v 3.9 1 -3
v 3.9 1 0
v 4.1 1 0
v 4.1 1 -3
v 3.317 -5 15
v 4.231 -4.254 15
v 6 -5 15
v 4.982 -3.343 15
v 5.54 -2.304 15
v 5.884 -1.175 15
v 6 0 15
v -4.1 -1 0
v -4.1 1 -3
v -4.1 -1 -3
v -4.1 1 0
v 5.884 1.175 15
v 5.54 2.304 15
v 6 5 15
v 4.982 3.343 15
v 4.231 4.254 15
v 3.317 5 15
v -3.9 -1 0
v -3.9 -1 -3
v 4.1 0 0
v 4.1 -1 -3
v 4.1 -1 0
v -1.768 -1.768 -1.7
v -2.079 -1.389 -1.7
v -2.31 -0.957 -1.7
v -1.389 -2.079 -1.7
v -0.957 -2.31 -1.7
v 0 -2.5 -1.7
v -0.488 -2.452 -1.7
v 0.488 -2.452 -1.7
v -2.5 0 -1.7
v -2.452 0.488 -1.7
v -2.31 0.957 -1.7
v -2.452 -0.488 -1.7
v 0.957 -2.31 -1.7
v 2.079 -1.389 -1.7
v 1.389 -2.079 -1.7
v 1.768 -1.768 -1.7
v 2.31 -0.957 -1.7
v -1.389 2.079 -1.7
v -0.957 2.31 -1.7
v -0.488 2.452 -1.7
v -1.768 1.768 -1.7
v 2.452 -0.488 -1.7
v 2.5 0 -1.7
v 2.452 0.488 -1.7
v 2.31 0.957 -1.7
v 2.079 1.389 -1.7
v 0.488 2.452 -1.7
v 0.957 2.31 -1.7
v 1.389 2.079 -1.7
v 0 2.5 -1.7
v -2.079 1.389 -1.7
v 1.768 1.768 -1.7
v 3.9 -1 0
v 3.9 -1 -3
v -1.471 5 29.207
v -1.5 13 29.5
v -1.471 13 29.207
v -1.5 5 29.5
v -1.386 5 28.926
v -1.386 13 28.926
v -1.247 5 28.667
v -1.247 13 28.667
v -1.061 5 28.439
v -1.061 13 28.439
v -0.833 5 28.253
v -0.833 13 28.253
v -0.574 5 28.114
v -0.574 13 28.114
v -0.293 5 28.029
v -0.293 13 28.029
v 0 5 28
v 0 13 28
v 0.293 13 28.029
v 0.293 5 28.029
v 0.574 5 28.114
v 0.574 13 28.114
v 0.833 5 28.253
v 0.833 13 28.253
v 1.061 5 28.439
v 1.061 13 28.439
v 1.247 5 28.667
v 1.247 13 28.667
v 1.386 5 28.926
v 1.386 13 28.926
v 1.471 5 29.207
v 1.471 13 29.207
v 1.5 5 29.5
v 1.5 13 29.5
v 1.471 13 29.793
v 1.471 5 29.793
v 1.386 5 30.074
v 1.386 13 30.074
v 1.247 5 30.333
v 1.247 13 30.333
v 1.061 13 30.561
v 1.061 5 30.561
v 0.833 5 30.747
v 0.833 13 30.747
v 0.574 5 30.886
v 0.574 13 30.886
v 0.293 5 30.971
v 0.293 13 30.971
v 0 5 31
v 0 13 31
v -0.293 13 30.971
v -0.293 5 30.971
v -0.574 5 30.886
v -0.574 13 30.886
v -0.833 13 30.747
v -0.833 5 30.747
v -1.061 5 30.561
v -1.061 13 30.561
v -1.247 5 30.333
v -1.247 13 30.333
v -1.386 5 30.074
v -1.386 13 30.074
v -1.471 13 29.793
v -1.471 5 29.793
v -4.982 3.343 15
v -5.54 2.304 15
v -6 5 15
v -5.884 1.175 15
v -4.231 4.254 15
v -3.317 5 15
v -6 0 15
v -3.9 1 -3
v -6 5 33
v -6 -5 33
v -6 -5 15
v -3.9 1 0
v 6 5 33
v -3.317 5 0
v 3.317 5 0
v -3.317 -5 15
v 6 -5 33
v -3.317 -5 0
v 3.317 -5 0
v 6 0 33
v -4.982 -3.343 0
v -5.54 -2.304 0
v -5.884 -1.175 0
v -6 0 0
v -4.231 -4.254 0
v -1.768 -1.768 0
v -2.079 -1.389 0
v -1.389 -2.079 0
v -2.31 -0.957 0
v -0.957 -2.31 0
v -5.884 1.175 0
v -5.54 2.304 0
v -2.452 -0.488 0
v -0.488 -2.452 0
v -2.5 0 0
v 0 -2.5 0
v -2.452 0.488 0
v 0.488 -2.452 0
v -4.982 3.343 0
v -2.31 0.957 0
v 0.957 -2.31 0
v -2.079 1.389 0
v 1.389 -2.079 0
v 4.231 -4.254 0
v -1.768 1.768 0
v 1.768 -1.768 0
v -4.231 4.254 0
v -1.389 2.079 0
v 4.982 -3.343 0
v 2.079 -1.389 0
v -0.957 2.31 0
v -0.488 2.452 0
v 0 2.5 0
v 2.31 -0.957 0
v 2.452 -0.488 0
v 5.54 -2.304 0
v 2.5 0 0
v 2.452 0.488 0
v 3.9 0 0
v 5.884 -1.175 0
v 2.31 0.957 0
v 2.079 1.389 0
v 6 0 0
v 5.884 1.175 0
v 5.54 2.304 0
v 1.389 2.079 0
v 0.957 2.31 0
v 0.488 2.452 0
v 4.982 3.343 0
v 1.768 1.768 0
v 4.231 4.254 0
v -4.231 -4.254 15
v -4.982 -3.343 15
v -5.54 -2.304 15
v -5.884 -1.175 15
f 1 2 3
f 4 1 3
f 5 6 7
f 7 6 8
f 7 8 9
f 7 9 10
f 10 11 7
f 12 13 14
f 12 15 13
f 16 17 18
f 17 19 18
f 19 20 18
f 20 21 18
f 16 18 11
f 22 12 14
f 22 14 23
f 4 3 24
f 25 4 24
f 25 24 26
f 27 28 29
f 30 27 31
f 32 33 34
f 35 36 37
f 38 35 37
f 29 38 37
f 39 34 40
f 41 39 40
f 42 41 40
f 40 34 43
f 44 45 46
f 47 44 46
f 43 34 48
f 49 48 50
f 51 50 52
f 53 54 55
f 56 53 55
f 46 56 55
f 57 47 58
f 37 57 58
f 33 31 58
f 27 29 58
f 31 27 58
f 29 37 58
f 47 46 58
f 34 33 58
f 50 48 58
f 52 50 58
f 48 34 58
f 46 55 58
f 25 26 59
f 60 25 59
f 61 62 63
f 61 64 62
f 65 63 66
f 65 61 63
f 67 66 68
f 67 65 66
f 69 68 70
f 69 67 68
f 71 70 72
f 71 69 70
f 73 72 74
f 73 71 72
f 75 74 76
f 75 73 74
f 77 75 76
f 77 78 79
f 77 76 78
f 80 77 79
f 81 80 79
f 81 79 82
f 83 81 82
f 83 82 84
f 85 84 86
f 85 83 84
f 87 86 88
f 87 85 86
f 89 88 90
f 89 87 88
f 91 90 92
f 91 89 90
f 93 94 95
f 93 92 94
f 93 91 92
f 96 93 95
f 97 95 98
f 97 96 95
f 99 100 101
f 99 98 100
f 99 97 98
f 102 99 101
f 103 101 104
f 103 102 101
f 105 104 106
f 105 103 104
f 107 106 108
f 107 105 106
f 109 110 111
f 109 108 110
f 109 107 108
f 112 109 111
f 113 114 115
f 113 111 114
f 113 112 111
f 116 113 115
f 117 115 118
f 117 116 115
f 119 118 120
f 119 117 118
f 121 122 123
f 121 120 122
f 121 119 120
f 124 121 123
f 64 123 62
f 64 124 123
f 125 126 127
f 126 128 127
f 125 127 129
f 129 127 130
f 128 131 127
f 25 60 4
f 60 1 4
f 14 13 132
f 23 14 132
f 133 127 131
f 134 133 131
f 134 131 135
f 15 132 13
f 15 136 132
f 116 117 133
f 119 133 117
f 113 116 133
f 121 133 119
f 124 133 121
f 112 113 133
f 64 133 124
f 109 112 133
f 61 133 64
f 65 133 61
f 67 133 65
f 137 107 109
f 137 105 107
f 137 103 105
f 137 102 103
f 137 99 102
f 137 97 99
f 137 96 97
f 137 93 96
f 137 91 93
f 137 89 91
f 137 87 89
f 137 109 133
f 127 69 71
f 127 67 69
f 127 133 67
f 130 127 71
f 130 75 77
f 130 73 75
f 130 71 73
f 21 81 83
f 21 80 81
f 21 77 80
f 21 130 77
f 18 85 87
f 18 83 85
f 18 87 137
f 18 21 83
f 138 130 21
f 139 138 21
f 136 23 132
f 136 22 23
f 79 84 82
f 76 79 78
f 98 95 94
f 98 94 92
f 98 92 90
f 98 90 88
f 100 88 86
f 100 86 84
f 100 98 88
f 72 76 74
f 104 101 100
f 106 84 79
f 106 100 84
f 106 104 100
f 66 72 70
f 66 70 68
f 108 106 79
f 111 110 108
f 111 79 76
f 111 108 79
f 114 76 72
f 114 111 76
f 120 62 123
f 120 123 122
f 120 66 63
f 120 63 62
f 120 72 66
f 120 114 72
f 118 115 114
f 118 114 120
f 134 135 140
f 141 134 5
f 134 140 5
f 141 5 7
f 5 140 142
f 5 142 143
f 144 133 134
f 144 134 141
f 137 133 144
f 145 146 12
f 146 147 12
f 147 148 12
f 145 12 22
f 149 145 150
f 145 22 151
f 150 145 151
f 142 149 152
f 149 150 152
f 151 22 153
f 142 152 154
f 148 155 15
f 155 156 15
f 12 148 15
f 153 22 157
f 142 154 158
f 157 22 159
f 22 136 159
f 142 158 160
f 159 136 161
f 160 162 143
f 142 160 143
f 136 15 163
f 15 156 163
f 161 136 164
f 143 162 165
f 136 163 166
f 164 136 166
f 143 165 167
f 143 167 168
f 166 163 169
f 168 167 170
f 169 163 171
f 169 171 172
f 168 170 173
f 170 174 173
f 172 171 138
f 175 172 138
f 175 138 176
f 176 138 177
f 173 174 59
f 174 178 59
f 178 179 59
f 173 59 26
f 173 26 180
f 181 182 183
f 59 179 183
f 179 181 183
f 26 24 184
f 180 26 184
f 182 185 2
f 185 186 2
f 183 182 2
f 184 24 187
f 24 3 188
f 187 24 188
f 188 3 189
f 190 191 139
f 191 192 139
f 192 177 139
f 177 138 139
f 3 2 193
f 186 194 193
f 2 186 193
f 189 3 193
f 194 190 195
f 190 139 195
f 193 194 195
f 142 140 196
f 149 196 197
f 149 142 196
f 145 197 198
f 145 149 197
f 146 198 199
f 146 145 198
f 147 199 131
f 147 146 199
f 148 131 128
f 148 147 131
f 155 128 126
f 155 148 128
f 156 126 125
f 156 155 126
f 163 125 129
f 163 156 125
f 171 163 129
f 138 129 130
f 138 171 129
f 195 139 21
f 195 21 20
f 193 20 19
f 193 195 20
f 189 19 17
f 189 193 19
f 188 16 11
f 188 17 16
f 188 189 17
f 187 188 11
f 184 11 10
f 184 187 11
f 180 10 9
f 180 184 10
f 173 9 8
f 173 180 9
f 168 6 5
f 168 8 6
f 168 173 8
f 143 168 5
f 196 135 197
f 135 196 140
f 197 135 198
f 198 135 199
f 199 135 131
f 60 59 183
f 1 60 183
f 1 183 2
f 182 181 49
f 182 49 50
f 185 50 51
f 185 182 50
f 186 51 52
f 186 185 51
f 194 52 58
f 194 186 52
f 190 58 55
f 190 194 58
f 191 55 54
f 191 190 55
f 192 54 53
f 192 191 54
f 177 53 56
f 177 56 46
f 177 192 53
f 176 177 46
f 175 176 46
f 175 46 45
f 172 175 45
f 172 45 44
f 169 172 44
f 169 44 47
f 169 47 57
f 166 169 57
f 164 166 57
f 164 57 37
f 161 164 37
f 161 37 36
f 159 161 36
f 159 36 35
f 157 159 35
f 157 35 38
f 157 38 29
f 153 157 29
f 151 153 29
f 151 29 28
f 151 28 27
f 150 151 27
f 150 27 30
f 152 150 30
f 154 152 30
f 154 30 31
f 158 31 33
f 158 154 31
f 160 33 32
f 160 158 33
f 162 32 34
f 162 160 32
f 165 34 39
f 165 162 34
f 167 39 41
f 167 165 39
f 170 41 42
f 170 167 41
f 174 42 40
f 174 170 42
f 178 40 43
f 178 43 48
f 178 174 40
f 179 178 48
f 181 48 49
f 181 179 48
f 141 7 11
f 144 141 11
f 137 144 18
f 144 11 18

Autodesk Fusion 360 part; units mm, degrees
sketch "Sketch1" plane through (0, 0, 0) normal (0, 0, 1) x (1, 0, 0)
  circle A0 centre (0, 0) radius 6
  line L0 (0, 0) -> (0, 5) construction
  line L1 (0, 5) -> (3.3166, 5)
  line L2 (0, 5) -> (-3.3166, 5)
  line L3 (20, 0) -> (2.5, 0)
  line L4 (0, -5) -> (3.3166, -5)
  line L5 (0, -5) -> (-3.3166, -5)
  circle A1 centre (0, 0) radius 2.5
  circle A2 centre (0, 0) radius 3.9 construction
  line L6 (-3.9, 0) -> (-3.9, 1)
  line L7 (-3.9, 1) -> (-4.1, 1)
  line L8 (-4.1, 1) -> (-4.1, -1)
  line L9 (-4.1, -1) -> (-3.9, -1)
  line L10 (-3.9, -1) -> (-3.9, 0)
  line L11 (4.1, 1) -> (4.1, -1)
  line L12 (3.9, 0) -> (3.9, 1)
  line L13 (3.9, 1) -> (4.1, 1)
  line L14 (3.9, -1) -> (3.9, 0)
  line L15 (4.1, -1) -> (3.9, -1)
  line L16 (6, 0) -> (6, 5)
  line L17 (6, 5) -> (-6, 5)
  line L18 (-6, 5) -> (-6, -5)
  line L19 (-6, -5) -> (6, -5)
  line L20 (6, -5) -> (6, 0)
  dimension "d1" = 12
  dimension "d2" = 5
  dimension "d5" = 5
  dimension "d8" = 7.8
  dimension "d9" = 1
  dimension "d10" = 0.2
  dimension "d11" = 2
  dimension "d12" = 0.2
  dimension "d15" = 5
  dimension "d16" = 12
  dimension "d17" = 10
  dimension "d18" = 12
extrude "Extrude1" add sketch "Sketch1" along normal blind 15 contours A0 L1 L2 L4 L5 L17 L19 | A1 | L3 L11 L14 L15 | L3 L11 L12 L13 | L6 L7 L8 L9 L10
extrude "Extrude2" add sketch "Sketch1" against normal blind 1.7 contours A1
extrude "Extrude3" add sketch "Sketch1" against normal blind 3 contours L3 L11 L14 L15 | L3 L11 L12 L13 | L6 L7 L8 L9 L10
extrude "Extrude4" add sketch "Sketch1" along normal blind 18 from surface at 15 contours A0 L1 L2 L4 L5 L17 L19 | A0 L19 L20 | A1 | L3 L11 L14 L15 | L3 L11 L12 L13 | A0 L16 L17 | A0 L17 L18 | A0 L18 L19 | L6 L7 L8 L9 L10
sketch "Sketch2" plane through (0, 5, 0) normal (0, 1, 0) x (-1, 0, 0)
  line L0 (-15, 0) -> (-15, 5)
  line L1 (-15, 5) -> (-33, 5)
  line L2 (-33, 5) -> (-33, -5)
  line L3 (-33, -5) -> (-15, -5)
  line L4 (-15, -5) -> (-15, 0)
  line L5 (-15, 0) -> (-31, 0) construction
  line L6 (-31, 0) -> (-29.5, 0) construction
  circle A0 centre (-29.5, 0) radius 1.5
  line L7 (-3.3166, 0) -> (3.3166, 0)
  line L8 (3.3166, 0) -> (3.3166, 15)
  line L9 (3.3166, 15) -> (6, 15)
  line L10 (6, 15) -> (6, 33)
  line L11 (6, 33) -> (-6, 33)
  line L12 (-6, 33) -> (-6, 15)
  line L13 (-6, 15) -> (-3.3166, 15)
  line L14 (-3.3166, 15) -> (-3.3166, 0)
  line L15 (3.3166, 15) -> (-3.3166, 15)
  line L16 (0, 15) -> (0, 31) construction
  line L17 (0, 31) -> (0, 29.5) construction
  circle A1 centre (0, 29.5) radius 1.5
  dimension "d22" = 16
  dimension "d23" = 1.5
  dimension "d24" = 3
  dimension "d25" = 16
  dimension "d26" = 1.5
  dimension "d27" = 3
extrude "Extrude5" add sketch "Sketch2" along normal blind 8 contours A1
